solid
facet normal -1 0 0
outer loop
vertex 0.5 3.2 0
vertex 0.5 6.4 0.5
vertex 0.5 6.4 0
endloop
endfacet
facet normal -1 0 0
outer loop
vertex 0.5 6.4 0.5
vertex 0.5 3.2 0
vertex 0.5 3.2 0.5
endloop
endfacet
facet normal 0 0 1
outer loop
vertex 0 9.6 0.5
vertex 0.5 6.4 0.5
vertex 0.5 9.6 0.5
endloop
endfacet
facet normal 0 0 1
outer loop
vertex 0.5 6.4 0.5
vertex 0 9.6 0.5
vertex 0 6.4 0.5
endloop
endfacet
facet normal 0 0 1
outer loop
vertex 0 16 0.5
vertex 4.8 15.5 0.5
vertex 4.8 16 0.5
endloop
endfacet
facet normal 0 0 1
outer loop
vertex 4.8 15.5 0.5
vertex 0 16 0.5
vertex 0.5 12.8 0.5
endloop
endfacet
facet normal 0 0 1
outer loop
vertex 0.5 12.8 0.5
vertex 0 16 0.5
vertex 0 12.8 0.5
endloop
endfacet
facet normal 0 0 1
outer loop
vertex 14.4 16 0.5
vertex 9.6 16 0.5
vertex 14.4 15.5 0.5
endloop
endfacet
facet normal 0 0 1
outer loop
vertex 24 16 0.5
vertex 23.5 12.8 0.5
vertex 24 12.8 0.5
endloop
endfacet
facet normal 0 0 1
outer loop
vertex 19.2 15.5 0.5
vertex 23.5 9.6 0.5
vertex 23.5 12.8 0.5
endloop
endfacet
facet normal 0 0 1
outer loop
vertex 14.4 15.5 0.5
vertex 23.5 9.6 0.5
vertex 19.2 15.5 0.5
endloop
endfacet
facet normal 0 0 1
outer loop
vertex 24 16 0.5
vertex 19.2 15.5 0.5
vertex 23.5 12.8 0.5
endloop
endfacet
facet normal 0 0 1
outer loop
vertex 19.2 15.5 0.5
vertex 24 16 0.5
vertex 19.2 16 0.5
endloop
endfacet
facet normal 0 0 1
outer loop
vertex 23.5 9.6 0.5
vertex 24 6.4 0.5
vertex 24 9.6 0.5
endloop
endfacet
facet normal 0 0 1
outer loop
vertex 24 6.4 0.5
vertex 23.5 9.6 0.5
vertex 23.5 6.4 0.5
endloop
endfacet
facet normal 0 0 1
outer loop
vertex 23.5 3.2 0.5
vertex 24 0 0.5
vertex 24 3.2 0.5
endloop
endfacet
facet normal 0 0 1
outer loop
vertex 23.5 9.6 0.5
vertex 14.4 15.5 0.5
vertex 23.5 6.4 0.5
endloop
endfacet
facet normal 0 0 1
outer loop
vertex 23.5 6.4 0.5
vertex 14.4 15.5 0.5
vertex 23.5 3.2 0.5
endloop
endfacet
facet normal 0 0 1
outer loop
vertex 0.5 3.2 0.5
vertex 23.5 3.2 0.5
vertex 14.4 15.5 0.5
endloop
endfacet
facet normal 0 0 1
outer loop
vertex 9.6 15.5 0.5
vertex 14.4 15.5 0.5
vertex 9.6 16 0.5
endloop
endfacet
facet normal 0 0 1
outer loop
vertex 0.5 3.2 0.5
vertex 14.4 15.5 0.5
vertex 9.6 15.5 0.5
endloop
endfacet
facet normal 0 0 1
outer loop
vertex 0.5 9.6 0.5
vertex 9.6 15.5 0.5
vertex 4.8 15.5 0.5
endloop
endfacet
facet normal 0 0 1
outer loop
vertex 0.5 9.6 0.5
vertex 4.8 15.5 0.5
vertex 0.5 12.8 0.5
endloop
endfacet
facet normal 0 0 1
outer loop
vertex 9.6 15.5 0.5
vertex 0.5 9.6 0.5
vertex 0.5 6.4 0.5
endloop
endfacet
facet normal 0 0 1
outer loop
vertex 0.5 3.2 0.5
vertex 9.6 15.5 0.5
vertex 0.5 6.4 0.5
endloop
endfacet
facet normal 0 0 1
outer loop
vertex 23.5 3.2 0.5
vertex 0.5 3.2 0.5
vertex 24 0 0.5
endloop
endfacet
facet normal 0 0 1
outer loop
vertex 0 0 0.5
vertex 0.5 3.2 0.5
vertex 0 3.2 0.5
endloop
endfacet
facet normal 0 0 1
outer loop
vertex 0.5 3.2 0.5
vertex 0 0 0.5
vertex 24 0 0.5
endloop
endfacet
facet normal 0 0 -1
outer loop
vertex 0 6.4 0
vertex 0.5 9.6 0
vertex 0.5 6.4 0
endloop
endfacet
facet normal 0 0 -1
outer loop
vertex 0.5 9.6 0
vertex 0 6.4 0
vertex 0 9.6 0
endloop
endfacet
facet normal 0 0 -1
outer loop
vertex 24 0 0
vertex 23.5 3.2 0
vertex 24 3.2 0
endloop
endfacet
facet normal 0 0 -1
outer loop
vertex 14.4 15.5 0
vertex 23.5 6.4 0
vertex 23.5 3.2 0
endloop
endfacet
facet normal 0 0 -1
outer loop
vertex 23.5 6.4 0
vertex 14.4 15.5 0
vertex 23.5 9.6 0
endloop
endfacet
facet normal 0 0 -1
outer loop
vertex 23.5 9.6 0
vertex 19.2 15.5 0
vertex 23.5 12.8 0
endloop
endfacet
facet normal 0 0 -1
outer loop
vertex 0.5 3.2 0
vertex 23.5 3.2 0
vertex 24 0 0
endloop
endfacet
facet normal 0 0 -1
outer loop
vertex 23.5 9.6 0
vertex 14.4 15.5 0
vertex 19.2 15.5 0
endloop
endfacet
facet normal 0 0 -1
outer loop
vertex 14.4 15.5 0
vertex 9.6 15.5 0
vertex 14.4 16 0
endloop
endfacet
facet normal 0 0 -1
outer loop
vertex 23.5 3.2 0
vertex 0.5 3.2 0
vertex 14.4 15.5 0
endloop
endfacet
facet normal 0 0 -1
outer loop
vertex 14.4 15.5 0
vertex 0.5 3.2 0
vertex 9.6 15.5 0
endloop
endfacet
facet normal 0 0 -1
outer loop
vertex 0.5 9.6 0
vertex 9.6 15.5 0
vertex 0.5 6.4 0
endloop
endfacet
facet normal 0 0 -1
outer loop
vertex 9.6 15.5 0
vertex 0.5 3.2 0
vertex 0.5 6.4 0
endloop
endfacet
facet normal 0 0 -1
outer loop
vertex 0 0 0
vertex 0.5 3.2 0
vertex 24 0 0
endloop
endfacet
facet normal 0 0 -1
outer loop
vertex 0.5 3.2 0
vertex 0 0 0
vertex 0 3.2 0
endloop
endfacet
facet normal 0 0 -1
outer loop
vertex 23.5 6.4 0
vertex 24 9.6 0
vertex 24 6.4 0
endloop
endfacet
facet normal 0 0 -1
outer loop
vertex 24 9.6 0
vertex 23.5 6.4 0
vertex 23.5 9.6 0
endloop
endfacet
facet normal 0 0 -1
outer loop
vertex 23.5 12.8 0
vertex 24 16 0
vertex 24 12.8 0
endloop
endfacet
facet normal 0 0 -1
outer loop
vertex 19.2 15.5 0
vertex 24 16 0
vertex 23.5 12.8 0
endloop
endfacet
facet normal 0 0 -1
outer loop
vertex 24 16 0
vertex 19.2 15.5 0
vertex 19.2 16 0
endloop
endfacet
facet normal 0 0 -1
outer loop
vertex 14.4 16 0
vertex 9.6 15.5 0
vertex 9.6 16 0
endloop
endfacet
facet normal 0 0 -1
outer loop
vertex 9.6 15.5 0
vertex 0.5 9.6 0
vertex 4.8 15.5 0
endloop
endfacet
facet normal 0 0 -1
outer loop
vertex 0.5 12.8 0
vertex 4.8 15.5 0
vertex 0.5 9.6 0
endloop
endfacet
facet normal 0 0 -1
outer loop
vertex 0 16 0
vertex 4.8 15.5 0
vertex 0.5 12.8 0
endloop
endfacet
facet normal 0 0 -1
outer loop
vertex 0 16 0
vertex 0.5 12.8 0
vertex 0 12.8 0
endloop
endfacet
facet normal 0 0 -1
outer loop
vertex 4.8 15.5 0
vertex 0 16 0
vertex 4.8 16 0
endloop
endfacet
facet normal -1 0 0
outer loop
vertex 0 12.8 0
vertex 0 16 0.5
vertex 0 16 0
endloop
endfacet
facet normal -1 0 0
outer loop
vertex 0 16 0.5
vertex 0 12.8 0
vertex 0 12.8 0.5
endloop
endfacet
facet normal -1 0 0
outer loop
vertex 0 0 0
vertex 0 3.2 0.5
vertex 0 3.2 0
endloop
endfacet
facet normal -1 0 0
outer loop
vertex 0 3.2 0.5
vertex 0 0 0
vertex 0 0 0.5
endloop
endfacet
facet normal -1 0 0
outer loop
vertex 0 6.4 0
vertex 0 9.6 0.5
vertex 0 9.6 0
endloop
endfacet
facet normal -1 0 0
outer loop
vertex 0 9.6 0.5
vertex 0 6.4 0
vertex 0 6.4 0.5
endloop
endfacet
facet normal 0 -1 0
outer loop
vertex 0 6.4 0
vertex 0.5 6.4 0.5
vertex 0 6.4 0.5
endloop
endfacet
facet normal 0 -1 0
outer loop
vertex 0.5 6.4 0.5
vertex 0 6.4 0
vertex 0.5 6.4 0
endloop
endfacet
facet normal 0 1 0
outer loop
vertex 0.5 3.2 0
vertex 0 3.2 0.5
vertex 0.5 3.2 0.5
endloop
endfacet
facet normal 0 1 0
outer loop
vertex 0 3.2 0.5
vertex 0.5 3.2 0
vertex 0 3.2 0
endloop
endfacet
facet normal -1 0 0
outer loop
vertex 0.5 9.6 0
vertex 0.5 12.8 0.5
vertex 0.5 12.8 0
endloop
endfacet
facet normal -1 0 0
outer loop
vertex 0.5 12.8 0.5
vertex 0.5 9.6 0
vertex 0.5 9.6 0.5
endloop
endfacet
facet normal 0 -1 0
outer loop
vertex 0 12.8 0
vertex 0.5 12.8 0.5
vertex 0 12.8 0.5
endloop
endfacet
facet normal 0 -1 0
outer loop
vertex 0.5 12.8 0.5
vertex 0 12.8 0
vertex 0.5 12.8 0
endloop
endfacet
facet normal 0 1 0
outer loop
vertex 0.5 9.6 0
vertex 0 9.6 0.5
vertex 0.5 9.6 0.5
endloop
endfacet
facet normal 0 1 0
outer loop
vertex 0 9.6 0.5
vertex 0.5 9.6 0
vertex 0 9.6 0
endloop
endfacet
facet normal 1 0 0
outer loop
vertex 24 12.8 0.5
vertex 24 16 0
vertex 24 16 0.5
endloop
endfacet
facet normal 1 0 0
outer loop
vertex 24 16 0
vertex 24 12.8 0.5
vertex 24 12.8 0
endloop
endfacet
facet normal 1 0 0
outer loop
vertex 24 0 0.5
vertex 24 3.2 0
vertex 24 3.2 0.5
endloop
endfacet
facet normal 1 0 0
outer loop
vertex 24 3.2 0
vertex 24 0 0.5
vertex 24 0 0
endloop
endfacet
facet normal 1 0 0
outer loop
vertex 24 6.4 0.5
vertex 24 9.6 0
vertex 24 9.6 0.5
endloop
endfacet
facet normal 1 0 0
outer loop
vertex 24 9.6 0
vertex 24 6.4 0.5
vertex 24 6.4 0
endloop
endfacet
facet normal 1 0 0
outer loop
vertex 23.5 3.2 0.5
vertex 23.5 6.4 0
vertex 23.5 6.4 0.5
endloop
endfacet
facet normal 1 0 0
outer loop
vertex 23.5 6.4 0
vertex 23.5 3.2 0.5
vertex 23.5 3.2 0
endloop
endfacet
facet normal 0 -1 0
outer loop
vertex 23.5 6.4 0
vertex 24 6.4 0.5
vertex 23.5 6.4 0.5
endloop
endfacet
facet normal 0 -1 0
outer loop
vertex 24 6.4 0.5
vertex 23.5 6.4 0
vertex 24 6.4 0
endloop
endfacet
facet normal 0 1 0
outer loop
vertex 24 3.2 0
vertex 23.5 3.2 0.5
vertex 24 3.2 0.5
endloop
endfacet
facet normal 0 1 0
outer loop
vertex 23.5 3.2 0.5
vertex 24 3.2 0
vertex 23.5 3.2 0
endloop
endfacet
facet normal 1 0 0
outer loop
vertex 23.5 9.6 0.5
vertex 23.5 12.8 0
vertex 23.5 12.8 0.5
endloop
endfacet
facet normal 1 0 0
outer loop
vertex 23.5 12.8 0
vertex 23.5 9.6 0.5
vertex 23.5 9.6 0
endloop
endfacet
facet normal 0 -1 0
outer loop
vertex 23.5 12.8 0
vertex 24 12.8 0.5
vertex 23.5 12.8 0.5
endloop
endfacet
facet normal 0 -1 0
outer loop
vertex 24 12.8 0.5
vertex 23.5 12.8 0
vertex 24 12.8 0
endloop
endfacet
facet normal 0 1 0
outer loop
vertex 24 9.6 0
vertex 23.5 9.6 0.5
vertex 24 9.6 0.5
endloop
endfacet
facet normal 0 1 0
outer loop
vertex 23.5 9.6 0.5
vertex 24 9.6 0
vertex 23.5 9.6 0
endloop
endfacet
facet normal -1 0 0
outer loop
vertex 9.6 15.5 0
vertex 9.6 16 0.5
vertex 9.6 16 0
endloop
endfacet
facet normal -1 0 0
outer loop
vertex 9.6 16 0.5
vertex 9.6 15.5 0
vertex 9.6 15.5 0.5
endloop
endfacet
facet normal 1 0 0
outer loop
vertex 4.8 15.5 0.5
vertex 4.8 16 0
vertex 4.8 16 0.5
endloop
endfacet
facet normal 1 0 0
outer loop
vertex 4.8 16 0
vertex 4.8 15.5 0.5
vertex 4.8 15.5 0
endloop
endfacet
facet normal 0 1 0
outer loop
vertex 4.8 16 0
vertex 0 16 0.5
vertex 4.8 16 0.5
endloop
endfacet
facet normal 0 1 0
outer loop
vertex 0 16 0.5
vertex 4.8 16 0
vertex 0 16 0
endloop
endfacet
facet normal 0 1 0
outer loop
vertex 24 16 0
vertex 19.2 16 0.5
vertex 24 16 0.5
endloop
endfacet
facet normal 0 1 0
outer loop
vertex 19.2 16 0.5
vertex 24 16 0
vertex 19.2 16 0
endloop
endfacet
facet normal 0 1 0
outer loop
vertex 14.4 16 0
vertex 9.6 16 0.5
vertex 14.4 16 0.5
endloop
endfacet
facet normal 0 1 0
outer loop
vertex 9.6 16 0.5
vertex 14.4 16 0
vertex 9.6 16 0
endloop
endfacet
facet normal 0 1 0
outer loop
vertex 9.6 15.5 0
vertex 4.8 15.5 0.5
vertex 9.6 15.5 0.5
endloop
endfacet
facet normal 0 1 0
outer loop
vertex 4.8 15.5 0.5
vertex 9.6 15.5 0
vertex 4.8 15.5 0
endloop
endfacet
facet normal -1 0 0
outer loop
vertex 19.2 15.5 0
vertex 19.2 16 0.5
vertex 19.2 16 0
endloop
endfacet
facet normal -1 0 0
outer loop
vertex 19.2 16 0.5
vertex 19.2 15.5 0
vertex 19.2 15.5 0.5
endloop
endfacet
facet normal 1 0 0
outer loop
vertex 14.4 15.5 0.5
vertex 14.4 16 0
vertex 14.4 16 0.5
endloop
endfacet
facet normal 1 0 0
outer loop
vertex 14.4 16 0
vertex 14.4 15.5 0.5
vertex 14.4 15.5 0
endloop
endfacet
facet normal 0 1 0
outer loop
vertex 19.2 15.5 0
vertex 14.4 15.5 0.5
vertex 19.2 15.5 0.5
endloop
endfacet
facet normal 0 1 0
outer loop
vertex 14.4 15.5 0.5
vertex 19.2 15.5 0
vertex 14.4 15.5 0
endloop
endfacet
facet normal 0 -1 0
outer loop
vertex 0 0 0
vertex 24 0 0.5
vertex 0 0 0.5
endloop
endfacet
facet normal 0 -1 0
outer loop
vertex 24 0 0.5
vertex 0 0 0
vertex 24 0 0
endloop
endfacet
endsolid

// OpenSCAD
wood=0.5;
l=24;
w=16;
h=10;

d=4;
r=d/2;
$fn=120;
wall=1;

pad=0.01;
padd=pad*2;

screw=0.25;

base();

module base() {
    difference() {
        cube([l,w,wood]);
        side_teeth();
        translate([l-wood,0,0])
        side_teeth();
        translate([0,w-wood,0])
        back_teeth();
    }
}

module lip() {
    translate([0,0,wood])
    difference() {
        cube([l,w,wood]);
        translate([wall,-pad,-pad])
        cube([l-wall*2,w-wall+pad,wood+padd]);
    }
}

module back_teeth() {
    translate([l/5,0,0])
    cube([l/5,wood,wood]);
    translate([l/5*3,0,0])
    cube([l/5,wood,wood]);
}

module side_teeth() {
    translate([0,w/5,0])
    cube([wood,w/5,wood]);
    translate([0,w/5*3,0])
    cube([wood,w/5,wood]);
}


module rounded() {
    difference() {
        color("lime")
        minkowski() {
            cube([l-d,w-d,wood/2]);
            cylinder(d=d,h=wood/2);
        }
        cylinder(d=screw,h=wood*2);
        translate([l-d,0,0])
        cylinder(d=screw,h=wood*2);
        translate([l-d,w-d,0])
        cylinder(d=screw,h=wood*2);
        translate([0,w-d,0])
        cylinder(d=screw,h=wood*2);
    }

    translate([0,0,wood*2])
    difference() {
        minkowski() {
            cube([l-d,w-d,wood/2]);
            cylinder(d=d,h=wood/2);
        }
        translate([0,-wall-r,-pad])
        minkowski() {
            cube([l-d,w-r+wall,wood/2+pad]);
            cylinder(d=d-wall*2,h=wood/2+pad);
        }

    }
}


module bad_leg() {
    translate([0,0,-h]) {
        difference() {
            cylinder(d=d,h=h);
            translate([0,0,-wood])
            cylinder(d=d-wall,h=h);
            translate([-r-pad,0,0])
            cube([d+padd,d+padd,h]);
            translate([0,-r-pad,0])
            cube([d+padd,d+padd,h]);
        }

        translate([-r+wood/2,0,0])
        cylinder(d=wood,h=h);
        translate([0,-r+wood/2,0])
        cylinder(d=wood,h=h);
    }
}
